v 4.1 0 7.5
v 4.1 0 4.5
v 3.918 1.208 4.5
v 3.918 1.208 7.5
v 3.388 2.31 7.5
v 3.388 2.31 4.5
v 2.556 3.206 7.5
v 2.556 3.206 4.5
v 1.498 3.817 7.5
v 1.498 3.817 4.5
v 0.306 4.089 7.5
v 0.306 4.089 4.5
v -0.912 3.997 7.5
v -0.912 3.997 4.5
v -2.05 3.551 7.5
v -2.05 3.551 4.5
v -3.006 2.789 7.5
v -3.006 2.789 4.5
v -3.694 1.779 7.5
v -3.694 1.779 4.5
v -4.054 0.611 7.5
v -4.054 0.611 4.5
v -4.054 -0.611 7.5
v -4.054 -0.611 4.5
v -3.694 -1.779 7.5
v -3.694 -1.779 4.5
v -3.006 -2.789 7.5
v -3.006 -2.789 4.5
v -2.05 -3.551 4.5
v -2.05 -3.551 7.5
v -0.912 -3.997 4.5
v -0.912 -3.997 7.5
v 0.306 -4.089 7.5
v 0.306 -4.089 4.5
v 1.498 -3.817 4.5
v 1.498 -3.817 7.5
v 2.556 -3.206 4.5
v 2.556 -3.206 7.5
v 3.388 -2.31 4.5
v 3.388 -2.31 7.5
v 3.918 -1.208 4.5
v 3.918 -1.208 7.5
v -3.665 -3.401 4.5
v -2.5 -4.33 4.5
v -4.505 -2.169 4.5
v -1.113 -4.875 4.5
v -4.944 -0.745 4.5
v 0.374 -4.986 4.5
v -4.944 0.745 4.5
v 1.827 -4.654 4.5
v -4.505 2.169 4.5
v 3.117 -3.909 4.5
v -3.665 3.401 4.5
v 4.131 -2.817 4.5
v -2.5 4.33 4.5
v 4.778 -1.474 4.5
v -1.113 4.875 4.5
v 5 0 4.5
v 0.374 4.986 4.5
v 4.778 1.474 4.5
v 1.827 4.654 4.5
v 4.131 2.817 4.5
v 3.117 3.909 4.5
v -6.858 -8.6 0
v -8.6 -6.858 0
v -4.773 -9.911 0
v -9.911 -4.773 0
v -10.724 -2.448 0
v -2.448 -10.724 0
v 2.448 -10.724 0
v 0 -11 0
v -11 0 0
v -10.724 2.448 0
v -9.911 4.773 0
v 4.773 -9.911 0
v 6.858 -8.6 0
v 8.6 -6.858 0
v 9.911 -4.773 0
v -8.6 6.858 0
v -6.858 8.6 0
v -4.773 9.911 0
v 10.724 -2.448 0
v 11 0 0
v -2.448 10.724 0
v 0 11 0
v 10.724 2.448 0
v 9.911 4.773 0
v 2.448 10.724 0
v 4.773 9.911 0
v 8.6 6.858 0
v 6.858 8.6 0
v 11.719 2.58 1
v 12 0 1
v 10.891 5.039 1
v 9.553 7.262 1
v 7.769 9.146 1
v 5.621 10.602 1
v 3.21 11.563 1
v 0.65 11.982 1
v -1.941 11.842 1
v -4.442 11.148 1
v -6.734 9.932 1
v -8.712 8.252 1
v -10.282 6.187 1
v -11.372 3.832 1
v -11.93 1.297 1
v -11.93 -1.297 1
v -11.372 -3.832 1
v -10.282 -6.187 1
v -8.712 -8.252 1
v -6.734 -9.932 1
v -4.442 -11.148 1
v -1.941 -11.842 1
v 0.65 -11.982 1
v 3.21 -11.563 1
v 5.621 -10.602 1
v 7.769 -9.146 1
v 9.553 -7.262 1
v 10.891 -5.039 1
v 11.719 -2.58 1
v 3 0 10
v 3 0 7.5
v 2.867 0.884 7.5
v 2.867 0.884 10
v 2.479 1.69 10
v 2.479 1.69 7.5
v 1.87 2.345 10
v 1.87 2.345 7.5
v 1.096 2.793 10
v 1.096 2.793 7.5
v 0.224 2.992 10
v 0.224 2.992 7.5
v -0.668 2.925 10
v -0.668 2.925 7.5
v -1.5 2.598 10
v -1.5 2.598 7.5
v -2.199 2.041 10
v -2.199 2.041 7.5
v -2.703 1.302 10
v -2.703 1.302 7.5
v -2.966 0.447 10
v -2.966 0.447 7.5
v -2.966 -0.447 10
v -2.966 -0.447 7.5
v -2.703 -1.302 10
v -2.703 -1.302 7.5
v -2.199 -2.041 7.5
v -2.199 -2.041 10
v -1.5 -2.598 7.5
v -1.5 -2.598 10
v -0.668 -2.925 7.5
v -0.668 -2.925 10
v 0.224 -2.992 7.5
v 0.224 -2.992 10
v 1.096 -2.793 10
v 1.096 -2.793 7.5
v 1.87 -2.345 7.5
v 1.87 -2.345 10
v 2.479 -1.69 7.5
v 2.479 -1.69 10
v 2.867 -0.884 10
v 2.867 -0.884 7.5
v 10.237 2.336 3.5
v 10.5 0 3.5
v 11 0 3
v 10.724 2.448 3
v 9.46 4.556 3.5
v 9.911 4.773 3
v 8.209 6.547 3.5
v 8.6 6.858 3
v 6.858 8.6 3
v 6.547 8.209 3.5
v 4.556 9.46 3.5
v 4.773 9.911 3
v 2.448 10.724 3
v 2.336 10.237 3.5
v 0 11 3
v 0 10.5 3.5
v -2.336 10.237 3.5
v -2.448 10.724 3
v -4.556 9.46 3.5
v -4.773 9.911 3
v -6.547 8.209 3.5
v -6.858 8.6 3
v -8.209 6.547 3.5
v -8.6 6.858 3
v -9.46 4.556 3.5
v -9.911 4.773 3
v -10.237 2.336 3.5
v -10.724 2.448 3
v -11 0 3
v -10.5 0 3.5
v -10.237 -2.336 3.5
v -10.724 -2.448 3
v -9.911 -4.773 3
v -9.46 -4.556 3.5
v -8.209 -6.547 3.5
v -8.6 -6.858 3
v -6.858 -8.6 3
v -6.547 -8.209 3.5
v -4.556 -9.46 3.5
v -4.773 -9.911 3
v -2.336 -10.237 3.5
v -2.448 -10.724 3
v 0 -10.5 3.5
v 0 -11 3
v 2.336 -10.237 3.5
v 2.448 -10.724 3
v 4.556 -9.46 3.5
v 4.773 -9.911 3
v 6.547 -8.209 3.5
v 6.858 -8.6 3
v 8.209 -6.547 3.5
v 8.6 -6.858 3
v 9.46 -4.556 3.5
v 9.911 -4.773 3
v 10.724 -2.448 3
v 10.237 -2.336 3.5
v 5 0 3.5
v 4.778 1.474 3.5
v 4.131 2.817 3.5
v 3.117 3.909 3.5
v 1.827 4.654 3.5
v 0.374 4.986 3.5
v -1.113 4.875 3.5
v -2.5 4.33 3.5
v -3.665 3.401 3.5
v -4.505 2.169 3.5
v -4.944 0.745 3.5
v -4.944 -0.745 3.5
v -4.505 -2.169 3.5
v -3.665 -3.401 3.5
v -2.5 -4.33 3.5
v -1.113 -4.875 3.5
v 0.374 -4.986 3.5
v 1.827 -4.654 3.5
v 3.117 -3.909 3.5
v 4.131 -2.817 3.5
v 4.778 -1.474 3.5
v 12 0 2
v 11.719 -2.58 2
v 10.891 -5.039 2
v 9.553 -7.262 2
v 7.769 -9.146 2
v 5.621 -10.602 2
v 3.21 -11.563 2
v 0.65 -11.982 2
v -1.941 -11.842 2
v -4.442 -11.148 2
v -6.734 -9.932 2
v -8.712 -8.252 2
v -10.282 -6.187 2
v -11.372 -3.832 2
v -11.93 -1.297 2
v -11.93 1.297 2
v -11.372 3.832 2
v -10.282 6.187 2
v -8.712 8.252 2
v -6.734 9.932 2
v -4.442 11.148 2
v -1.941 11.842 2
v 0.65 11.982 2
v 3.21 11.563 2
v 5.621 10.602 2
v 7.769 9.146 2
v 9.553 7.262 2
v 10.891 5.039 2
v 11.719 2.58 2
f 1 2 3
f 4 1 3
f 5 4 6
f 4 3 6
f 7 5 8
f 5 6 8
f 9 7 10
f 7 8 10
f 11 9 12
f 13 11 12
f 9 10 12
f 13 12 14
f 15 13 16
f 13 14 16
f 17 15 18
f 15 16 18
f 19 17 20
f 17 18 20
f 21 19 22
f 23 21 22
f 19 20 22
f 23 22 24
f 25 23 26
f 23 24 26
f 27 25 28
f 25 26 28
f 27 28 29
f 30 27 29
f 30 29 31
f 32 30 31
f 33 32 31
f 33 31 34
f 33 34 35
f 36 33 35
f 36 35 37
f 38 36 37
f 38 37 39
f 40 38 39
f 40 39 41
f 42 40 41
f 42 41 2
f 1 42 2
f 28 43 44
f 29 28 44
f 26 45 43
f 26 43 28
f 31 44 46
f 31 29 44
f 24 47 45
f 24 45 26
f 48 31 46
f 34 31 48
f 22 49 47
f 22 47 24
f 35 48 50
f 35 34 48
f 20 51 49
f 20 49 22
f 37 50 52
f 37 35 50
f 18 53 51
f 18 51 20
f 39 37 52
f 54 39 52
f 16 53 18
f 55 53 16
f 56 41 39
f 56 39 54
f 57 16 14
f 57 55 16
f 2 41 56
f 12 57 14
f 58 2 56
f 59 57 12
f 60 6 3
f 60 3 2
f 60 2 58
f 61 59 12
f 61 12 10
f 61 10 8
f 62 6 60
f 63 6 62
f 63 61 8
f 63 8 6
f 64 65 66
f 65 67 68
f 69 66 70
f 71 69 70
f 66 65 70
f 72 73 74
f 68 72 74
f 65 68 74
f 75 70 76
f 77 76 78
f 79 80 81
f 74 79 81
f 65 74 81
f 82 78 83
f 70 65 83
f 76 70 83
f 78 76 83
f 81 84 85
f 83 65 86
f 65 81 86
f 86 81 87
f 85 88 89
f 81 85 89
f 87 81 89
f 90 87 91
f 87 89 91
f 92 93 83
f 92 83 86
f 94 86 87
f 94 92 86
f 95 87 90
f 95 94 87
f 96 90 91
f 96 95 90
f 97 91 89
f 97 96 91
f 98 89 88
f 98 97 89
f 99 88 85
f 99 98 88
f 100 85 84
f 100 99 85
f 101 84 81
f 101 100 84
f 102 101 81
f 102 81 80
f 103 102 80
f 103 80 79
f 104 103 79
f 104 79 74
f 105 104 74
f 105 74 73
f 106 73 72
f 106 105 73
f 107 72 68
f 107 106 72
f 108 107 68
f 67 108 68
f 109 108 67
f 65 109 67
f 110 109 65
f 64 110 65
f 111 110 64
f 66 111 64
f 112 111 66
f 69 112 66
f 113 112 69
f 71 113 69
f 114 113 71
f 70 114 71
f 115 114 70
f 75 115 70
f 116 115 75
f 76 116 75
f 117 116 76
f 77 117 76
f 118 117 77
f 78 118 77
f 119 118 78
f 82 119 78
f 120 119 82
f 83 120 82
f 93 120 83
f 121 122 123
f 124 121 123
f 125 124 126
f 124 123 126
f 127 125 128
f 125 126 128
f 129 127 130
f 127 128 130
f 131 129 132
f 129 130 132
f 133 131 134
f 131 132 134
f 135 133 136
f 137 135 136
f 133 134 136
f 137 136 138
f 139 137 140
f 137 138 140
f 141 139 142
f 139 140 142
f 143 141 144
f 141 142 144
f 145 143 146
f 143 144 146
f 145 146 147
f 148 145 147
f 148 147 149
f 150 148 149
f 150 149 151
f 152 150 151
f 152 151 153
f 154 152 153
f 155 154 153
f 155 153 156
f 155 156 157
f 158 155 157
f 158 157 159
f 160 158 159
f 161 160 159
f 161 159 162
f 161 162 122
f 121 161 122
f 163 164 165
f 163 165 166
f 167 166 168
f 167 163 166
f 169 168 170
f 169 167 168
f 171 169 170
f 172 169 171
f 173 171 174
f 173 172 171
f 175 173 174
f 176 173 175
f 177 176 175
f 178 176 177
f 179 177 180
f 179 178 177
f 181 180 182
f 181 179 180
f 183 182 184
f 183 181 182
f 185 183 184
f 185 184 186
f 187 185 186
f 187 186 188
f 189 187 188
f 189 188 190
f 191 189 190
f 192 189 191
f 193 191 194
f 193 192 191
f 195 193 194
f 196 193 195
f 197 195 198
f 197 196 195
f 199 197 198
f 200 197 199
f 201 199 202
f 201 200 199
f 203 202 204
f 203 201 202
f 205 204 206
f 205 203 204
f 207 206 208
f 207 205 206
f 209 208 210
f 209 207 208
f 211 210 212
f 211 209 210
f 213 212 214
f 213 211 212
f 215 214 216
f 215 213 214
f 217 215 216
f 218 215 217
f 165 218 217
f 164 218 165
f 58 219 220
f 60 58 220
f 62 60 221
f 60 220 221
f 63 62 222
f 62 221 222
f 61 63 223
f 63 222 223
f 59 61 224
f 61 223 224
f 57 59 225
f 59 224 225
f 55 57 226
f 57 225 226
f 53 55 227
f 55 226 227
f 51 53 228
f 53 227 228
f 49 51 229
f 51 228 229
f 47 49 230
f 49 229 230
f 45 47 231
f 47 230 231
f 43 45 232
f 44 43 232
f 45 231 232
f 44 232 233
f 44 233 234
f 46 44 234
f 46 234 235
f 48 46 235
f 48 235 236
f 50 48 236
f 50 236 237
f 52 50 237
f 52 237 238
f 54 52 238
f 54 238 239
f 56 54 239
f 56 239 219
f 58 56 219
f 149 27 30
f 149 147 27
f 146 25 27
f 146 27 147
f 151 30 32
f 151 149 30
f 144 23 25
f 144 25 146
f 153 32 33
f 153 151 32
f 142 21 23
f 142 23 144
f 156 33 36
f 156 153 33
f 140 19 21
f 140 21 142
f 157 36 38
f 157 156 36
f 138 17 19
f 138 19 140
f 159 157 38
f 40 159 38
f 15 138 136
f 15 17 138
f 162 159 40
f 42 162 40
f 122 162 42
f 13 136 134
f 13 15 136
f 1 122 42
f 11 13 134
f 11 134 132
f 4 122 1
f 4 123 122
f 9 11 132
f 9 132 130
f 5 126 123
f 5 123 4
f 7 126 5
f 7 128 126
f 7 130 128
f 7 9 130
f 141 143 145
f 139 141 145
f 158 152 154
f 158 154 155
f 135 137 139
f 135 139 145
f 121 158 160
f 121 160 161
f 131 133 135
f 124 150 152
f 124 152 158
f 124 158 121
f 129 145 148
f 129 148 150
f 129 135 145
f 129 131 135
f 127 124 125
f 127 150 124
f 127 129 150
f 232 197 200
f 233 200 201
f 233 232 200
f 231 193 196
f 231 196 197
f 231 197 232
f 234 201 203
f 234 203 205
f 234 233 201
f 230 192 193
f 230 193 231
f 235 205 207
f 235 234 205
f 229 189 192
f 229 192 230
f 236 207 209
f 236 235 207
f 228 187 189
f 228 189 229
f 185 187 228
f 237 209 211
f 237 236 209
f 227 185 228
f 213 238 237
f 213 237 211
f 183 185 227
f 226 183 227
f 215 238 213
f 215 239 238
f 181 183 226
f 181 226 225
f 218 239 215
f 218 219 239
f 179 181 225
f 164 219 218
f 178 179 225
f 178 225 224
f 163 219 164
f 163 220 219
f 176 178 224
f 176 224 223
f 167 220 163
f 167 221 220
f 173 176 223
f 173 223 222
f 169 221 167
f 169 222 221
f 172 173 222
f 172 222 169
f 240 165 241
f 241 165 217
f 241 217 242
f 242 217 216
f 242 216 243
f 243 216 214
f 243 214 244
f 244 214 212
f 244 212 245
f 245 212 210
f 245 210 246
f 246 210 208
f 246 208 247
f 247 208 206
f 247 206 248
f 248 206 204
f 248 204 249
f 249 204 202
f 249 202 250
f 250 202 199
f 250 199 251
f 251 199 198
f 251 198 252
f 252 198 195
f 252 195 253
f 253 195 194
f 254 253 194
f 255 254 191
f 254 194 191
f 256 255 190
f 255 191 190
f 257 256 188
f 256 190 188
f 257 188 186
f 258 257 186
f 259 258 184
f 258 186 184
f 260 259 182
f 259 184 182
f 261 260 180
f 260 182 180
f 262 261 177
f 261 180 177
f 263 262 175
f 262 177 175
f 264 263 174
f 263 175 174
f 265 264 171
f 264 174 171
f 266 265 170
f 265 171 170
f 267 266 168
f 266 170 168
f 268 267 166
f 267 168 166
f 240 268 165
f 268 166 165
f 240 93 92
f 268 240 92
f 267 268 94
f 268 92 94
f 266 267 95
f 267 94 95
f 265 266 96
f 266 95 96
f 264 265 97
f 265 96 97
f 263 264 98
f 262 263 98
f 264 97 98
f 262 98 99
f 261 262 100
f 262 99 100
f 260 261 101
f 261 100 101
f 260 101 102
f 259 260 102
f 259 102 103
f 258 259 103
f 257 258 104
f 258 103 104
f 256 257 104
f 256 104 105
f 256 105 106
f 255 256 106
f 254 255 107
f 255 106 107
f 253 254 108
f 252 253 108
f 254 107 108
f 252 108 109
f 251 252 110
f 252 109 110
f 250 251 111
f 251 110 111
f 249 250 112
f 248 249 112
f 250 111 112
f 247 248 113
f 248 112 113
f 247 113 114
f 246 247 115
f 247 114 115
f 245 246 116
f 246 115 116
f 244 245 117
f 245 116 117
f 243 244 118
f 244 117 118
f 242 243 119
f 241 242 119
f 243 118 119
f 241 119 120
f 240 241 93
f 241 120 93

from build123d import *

# Parameters (mm, degrees)
F0_R     = 12
F0_R_2   = 11
F0_R_3   = 5
F0_R_4   = 4.1
F0_R_5   = 3
F1_DEPTH = 2
F2_DEPTH = 3.5
F3_SIZE  = 0.99999
F4_DEPTH = 4.5
F5_DEPTH = 7.5
F6_DEPTH = 10
F7_SIZE  = 1
F8_SIZE  = 0.5


# Not quite as in the source:
# - a fillet or chamfer is up to 0.001 mm smaller than in the source, because OpenCascade refuses the exact size


with BuildPart() as f1:
    # F0 (on Top) → F1 (new body)
    with BuildSketch(Plane.XY):
        Circle(F0_R)
        Circle(F0_R_2, mode=Mode.SUBTRACT)
        Circle(F0_R_2)
        Circle(F0_R_3, mode=Mode.SUBTRACT)
        Circle(F0_R_3)
        Circle(F0_R_4, mode=Mode.SUBTRACT)
        Circle(F0_R_4)
        Circle(F0_R_5, mode=Mode.SUBTRACT)
        Circle(F0_R_5)
    extrude(amount=F1_DEPTH)

    # F0 (on Top) → F2 (join)
    with BuildSketch(Plane.XY):
        Circle(F0_R_2)
        Circle(F0_R_3, mode=Mode.SUBTRACT)
        Circle(F0_R_3)
        Circle(F0_R_4, mode=Mode.SUBTRACT)
        Circle(F0_R_4)
        Circle(F0_R_5, mode=Mode.SUBTRACT)
        Circle(F0_R_5)
    extrude(amount=F2_DEPTH)

    # F3 (size 1 in the source; OpenCascade refuses exactly that, so slightly less here)
    f3_edges = [f1.edges().sort_by_distance(p)[0] for p in [
        (-11, 0, 2),
    ]]
    chamfer(f3_edges, length=F3_SIZE)

    # F0 (on Top) → F4 (join)
    with BuildSketch(Plane.XY):
        Circle(F0_R_3)
        Circle(F0_R_4, mode=Mode.SUBTRACT)
        Circle(F0_R_4)
        Circle(F0_R_5, mode=Mode.SUBTRACT)
        Circle(F0_R_5)
    extrude(amount=F4_DEPTH)

    # F0 (on Top) → F5 (join)
    with BuildSketch(Plane.XY):
        Circle(F0_R_4)
        Circle(F0_R_5, mode=Mode.SUBTRACT)
    extrude(amount=F5_DEPTH)

    # F0 (on Top) → F6 (join)
    with BuildSketch(Plane.XY):
        Circle(F0_R_5)
    extrude(amount=F6_DEPTH)

    # F7
    f7_edges = [f1.edges().sort_by_distance(p)[0] for p in [
        (-12, 0, 0),
    ]]
    chamfer(f7_edges, length=F7_SIZE)

    # F8
    f8_edges = [f1.edges().sort_by_distance(p)[0] for p in [
        (-11, 0, 3.5),
    ]]
    chamfer(f8_edges, length=F8_SIZE)


solid = f1.part
